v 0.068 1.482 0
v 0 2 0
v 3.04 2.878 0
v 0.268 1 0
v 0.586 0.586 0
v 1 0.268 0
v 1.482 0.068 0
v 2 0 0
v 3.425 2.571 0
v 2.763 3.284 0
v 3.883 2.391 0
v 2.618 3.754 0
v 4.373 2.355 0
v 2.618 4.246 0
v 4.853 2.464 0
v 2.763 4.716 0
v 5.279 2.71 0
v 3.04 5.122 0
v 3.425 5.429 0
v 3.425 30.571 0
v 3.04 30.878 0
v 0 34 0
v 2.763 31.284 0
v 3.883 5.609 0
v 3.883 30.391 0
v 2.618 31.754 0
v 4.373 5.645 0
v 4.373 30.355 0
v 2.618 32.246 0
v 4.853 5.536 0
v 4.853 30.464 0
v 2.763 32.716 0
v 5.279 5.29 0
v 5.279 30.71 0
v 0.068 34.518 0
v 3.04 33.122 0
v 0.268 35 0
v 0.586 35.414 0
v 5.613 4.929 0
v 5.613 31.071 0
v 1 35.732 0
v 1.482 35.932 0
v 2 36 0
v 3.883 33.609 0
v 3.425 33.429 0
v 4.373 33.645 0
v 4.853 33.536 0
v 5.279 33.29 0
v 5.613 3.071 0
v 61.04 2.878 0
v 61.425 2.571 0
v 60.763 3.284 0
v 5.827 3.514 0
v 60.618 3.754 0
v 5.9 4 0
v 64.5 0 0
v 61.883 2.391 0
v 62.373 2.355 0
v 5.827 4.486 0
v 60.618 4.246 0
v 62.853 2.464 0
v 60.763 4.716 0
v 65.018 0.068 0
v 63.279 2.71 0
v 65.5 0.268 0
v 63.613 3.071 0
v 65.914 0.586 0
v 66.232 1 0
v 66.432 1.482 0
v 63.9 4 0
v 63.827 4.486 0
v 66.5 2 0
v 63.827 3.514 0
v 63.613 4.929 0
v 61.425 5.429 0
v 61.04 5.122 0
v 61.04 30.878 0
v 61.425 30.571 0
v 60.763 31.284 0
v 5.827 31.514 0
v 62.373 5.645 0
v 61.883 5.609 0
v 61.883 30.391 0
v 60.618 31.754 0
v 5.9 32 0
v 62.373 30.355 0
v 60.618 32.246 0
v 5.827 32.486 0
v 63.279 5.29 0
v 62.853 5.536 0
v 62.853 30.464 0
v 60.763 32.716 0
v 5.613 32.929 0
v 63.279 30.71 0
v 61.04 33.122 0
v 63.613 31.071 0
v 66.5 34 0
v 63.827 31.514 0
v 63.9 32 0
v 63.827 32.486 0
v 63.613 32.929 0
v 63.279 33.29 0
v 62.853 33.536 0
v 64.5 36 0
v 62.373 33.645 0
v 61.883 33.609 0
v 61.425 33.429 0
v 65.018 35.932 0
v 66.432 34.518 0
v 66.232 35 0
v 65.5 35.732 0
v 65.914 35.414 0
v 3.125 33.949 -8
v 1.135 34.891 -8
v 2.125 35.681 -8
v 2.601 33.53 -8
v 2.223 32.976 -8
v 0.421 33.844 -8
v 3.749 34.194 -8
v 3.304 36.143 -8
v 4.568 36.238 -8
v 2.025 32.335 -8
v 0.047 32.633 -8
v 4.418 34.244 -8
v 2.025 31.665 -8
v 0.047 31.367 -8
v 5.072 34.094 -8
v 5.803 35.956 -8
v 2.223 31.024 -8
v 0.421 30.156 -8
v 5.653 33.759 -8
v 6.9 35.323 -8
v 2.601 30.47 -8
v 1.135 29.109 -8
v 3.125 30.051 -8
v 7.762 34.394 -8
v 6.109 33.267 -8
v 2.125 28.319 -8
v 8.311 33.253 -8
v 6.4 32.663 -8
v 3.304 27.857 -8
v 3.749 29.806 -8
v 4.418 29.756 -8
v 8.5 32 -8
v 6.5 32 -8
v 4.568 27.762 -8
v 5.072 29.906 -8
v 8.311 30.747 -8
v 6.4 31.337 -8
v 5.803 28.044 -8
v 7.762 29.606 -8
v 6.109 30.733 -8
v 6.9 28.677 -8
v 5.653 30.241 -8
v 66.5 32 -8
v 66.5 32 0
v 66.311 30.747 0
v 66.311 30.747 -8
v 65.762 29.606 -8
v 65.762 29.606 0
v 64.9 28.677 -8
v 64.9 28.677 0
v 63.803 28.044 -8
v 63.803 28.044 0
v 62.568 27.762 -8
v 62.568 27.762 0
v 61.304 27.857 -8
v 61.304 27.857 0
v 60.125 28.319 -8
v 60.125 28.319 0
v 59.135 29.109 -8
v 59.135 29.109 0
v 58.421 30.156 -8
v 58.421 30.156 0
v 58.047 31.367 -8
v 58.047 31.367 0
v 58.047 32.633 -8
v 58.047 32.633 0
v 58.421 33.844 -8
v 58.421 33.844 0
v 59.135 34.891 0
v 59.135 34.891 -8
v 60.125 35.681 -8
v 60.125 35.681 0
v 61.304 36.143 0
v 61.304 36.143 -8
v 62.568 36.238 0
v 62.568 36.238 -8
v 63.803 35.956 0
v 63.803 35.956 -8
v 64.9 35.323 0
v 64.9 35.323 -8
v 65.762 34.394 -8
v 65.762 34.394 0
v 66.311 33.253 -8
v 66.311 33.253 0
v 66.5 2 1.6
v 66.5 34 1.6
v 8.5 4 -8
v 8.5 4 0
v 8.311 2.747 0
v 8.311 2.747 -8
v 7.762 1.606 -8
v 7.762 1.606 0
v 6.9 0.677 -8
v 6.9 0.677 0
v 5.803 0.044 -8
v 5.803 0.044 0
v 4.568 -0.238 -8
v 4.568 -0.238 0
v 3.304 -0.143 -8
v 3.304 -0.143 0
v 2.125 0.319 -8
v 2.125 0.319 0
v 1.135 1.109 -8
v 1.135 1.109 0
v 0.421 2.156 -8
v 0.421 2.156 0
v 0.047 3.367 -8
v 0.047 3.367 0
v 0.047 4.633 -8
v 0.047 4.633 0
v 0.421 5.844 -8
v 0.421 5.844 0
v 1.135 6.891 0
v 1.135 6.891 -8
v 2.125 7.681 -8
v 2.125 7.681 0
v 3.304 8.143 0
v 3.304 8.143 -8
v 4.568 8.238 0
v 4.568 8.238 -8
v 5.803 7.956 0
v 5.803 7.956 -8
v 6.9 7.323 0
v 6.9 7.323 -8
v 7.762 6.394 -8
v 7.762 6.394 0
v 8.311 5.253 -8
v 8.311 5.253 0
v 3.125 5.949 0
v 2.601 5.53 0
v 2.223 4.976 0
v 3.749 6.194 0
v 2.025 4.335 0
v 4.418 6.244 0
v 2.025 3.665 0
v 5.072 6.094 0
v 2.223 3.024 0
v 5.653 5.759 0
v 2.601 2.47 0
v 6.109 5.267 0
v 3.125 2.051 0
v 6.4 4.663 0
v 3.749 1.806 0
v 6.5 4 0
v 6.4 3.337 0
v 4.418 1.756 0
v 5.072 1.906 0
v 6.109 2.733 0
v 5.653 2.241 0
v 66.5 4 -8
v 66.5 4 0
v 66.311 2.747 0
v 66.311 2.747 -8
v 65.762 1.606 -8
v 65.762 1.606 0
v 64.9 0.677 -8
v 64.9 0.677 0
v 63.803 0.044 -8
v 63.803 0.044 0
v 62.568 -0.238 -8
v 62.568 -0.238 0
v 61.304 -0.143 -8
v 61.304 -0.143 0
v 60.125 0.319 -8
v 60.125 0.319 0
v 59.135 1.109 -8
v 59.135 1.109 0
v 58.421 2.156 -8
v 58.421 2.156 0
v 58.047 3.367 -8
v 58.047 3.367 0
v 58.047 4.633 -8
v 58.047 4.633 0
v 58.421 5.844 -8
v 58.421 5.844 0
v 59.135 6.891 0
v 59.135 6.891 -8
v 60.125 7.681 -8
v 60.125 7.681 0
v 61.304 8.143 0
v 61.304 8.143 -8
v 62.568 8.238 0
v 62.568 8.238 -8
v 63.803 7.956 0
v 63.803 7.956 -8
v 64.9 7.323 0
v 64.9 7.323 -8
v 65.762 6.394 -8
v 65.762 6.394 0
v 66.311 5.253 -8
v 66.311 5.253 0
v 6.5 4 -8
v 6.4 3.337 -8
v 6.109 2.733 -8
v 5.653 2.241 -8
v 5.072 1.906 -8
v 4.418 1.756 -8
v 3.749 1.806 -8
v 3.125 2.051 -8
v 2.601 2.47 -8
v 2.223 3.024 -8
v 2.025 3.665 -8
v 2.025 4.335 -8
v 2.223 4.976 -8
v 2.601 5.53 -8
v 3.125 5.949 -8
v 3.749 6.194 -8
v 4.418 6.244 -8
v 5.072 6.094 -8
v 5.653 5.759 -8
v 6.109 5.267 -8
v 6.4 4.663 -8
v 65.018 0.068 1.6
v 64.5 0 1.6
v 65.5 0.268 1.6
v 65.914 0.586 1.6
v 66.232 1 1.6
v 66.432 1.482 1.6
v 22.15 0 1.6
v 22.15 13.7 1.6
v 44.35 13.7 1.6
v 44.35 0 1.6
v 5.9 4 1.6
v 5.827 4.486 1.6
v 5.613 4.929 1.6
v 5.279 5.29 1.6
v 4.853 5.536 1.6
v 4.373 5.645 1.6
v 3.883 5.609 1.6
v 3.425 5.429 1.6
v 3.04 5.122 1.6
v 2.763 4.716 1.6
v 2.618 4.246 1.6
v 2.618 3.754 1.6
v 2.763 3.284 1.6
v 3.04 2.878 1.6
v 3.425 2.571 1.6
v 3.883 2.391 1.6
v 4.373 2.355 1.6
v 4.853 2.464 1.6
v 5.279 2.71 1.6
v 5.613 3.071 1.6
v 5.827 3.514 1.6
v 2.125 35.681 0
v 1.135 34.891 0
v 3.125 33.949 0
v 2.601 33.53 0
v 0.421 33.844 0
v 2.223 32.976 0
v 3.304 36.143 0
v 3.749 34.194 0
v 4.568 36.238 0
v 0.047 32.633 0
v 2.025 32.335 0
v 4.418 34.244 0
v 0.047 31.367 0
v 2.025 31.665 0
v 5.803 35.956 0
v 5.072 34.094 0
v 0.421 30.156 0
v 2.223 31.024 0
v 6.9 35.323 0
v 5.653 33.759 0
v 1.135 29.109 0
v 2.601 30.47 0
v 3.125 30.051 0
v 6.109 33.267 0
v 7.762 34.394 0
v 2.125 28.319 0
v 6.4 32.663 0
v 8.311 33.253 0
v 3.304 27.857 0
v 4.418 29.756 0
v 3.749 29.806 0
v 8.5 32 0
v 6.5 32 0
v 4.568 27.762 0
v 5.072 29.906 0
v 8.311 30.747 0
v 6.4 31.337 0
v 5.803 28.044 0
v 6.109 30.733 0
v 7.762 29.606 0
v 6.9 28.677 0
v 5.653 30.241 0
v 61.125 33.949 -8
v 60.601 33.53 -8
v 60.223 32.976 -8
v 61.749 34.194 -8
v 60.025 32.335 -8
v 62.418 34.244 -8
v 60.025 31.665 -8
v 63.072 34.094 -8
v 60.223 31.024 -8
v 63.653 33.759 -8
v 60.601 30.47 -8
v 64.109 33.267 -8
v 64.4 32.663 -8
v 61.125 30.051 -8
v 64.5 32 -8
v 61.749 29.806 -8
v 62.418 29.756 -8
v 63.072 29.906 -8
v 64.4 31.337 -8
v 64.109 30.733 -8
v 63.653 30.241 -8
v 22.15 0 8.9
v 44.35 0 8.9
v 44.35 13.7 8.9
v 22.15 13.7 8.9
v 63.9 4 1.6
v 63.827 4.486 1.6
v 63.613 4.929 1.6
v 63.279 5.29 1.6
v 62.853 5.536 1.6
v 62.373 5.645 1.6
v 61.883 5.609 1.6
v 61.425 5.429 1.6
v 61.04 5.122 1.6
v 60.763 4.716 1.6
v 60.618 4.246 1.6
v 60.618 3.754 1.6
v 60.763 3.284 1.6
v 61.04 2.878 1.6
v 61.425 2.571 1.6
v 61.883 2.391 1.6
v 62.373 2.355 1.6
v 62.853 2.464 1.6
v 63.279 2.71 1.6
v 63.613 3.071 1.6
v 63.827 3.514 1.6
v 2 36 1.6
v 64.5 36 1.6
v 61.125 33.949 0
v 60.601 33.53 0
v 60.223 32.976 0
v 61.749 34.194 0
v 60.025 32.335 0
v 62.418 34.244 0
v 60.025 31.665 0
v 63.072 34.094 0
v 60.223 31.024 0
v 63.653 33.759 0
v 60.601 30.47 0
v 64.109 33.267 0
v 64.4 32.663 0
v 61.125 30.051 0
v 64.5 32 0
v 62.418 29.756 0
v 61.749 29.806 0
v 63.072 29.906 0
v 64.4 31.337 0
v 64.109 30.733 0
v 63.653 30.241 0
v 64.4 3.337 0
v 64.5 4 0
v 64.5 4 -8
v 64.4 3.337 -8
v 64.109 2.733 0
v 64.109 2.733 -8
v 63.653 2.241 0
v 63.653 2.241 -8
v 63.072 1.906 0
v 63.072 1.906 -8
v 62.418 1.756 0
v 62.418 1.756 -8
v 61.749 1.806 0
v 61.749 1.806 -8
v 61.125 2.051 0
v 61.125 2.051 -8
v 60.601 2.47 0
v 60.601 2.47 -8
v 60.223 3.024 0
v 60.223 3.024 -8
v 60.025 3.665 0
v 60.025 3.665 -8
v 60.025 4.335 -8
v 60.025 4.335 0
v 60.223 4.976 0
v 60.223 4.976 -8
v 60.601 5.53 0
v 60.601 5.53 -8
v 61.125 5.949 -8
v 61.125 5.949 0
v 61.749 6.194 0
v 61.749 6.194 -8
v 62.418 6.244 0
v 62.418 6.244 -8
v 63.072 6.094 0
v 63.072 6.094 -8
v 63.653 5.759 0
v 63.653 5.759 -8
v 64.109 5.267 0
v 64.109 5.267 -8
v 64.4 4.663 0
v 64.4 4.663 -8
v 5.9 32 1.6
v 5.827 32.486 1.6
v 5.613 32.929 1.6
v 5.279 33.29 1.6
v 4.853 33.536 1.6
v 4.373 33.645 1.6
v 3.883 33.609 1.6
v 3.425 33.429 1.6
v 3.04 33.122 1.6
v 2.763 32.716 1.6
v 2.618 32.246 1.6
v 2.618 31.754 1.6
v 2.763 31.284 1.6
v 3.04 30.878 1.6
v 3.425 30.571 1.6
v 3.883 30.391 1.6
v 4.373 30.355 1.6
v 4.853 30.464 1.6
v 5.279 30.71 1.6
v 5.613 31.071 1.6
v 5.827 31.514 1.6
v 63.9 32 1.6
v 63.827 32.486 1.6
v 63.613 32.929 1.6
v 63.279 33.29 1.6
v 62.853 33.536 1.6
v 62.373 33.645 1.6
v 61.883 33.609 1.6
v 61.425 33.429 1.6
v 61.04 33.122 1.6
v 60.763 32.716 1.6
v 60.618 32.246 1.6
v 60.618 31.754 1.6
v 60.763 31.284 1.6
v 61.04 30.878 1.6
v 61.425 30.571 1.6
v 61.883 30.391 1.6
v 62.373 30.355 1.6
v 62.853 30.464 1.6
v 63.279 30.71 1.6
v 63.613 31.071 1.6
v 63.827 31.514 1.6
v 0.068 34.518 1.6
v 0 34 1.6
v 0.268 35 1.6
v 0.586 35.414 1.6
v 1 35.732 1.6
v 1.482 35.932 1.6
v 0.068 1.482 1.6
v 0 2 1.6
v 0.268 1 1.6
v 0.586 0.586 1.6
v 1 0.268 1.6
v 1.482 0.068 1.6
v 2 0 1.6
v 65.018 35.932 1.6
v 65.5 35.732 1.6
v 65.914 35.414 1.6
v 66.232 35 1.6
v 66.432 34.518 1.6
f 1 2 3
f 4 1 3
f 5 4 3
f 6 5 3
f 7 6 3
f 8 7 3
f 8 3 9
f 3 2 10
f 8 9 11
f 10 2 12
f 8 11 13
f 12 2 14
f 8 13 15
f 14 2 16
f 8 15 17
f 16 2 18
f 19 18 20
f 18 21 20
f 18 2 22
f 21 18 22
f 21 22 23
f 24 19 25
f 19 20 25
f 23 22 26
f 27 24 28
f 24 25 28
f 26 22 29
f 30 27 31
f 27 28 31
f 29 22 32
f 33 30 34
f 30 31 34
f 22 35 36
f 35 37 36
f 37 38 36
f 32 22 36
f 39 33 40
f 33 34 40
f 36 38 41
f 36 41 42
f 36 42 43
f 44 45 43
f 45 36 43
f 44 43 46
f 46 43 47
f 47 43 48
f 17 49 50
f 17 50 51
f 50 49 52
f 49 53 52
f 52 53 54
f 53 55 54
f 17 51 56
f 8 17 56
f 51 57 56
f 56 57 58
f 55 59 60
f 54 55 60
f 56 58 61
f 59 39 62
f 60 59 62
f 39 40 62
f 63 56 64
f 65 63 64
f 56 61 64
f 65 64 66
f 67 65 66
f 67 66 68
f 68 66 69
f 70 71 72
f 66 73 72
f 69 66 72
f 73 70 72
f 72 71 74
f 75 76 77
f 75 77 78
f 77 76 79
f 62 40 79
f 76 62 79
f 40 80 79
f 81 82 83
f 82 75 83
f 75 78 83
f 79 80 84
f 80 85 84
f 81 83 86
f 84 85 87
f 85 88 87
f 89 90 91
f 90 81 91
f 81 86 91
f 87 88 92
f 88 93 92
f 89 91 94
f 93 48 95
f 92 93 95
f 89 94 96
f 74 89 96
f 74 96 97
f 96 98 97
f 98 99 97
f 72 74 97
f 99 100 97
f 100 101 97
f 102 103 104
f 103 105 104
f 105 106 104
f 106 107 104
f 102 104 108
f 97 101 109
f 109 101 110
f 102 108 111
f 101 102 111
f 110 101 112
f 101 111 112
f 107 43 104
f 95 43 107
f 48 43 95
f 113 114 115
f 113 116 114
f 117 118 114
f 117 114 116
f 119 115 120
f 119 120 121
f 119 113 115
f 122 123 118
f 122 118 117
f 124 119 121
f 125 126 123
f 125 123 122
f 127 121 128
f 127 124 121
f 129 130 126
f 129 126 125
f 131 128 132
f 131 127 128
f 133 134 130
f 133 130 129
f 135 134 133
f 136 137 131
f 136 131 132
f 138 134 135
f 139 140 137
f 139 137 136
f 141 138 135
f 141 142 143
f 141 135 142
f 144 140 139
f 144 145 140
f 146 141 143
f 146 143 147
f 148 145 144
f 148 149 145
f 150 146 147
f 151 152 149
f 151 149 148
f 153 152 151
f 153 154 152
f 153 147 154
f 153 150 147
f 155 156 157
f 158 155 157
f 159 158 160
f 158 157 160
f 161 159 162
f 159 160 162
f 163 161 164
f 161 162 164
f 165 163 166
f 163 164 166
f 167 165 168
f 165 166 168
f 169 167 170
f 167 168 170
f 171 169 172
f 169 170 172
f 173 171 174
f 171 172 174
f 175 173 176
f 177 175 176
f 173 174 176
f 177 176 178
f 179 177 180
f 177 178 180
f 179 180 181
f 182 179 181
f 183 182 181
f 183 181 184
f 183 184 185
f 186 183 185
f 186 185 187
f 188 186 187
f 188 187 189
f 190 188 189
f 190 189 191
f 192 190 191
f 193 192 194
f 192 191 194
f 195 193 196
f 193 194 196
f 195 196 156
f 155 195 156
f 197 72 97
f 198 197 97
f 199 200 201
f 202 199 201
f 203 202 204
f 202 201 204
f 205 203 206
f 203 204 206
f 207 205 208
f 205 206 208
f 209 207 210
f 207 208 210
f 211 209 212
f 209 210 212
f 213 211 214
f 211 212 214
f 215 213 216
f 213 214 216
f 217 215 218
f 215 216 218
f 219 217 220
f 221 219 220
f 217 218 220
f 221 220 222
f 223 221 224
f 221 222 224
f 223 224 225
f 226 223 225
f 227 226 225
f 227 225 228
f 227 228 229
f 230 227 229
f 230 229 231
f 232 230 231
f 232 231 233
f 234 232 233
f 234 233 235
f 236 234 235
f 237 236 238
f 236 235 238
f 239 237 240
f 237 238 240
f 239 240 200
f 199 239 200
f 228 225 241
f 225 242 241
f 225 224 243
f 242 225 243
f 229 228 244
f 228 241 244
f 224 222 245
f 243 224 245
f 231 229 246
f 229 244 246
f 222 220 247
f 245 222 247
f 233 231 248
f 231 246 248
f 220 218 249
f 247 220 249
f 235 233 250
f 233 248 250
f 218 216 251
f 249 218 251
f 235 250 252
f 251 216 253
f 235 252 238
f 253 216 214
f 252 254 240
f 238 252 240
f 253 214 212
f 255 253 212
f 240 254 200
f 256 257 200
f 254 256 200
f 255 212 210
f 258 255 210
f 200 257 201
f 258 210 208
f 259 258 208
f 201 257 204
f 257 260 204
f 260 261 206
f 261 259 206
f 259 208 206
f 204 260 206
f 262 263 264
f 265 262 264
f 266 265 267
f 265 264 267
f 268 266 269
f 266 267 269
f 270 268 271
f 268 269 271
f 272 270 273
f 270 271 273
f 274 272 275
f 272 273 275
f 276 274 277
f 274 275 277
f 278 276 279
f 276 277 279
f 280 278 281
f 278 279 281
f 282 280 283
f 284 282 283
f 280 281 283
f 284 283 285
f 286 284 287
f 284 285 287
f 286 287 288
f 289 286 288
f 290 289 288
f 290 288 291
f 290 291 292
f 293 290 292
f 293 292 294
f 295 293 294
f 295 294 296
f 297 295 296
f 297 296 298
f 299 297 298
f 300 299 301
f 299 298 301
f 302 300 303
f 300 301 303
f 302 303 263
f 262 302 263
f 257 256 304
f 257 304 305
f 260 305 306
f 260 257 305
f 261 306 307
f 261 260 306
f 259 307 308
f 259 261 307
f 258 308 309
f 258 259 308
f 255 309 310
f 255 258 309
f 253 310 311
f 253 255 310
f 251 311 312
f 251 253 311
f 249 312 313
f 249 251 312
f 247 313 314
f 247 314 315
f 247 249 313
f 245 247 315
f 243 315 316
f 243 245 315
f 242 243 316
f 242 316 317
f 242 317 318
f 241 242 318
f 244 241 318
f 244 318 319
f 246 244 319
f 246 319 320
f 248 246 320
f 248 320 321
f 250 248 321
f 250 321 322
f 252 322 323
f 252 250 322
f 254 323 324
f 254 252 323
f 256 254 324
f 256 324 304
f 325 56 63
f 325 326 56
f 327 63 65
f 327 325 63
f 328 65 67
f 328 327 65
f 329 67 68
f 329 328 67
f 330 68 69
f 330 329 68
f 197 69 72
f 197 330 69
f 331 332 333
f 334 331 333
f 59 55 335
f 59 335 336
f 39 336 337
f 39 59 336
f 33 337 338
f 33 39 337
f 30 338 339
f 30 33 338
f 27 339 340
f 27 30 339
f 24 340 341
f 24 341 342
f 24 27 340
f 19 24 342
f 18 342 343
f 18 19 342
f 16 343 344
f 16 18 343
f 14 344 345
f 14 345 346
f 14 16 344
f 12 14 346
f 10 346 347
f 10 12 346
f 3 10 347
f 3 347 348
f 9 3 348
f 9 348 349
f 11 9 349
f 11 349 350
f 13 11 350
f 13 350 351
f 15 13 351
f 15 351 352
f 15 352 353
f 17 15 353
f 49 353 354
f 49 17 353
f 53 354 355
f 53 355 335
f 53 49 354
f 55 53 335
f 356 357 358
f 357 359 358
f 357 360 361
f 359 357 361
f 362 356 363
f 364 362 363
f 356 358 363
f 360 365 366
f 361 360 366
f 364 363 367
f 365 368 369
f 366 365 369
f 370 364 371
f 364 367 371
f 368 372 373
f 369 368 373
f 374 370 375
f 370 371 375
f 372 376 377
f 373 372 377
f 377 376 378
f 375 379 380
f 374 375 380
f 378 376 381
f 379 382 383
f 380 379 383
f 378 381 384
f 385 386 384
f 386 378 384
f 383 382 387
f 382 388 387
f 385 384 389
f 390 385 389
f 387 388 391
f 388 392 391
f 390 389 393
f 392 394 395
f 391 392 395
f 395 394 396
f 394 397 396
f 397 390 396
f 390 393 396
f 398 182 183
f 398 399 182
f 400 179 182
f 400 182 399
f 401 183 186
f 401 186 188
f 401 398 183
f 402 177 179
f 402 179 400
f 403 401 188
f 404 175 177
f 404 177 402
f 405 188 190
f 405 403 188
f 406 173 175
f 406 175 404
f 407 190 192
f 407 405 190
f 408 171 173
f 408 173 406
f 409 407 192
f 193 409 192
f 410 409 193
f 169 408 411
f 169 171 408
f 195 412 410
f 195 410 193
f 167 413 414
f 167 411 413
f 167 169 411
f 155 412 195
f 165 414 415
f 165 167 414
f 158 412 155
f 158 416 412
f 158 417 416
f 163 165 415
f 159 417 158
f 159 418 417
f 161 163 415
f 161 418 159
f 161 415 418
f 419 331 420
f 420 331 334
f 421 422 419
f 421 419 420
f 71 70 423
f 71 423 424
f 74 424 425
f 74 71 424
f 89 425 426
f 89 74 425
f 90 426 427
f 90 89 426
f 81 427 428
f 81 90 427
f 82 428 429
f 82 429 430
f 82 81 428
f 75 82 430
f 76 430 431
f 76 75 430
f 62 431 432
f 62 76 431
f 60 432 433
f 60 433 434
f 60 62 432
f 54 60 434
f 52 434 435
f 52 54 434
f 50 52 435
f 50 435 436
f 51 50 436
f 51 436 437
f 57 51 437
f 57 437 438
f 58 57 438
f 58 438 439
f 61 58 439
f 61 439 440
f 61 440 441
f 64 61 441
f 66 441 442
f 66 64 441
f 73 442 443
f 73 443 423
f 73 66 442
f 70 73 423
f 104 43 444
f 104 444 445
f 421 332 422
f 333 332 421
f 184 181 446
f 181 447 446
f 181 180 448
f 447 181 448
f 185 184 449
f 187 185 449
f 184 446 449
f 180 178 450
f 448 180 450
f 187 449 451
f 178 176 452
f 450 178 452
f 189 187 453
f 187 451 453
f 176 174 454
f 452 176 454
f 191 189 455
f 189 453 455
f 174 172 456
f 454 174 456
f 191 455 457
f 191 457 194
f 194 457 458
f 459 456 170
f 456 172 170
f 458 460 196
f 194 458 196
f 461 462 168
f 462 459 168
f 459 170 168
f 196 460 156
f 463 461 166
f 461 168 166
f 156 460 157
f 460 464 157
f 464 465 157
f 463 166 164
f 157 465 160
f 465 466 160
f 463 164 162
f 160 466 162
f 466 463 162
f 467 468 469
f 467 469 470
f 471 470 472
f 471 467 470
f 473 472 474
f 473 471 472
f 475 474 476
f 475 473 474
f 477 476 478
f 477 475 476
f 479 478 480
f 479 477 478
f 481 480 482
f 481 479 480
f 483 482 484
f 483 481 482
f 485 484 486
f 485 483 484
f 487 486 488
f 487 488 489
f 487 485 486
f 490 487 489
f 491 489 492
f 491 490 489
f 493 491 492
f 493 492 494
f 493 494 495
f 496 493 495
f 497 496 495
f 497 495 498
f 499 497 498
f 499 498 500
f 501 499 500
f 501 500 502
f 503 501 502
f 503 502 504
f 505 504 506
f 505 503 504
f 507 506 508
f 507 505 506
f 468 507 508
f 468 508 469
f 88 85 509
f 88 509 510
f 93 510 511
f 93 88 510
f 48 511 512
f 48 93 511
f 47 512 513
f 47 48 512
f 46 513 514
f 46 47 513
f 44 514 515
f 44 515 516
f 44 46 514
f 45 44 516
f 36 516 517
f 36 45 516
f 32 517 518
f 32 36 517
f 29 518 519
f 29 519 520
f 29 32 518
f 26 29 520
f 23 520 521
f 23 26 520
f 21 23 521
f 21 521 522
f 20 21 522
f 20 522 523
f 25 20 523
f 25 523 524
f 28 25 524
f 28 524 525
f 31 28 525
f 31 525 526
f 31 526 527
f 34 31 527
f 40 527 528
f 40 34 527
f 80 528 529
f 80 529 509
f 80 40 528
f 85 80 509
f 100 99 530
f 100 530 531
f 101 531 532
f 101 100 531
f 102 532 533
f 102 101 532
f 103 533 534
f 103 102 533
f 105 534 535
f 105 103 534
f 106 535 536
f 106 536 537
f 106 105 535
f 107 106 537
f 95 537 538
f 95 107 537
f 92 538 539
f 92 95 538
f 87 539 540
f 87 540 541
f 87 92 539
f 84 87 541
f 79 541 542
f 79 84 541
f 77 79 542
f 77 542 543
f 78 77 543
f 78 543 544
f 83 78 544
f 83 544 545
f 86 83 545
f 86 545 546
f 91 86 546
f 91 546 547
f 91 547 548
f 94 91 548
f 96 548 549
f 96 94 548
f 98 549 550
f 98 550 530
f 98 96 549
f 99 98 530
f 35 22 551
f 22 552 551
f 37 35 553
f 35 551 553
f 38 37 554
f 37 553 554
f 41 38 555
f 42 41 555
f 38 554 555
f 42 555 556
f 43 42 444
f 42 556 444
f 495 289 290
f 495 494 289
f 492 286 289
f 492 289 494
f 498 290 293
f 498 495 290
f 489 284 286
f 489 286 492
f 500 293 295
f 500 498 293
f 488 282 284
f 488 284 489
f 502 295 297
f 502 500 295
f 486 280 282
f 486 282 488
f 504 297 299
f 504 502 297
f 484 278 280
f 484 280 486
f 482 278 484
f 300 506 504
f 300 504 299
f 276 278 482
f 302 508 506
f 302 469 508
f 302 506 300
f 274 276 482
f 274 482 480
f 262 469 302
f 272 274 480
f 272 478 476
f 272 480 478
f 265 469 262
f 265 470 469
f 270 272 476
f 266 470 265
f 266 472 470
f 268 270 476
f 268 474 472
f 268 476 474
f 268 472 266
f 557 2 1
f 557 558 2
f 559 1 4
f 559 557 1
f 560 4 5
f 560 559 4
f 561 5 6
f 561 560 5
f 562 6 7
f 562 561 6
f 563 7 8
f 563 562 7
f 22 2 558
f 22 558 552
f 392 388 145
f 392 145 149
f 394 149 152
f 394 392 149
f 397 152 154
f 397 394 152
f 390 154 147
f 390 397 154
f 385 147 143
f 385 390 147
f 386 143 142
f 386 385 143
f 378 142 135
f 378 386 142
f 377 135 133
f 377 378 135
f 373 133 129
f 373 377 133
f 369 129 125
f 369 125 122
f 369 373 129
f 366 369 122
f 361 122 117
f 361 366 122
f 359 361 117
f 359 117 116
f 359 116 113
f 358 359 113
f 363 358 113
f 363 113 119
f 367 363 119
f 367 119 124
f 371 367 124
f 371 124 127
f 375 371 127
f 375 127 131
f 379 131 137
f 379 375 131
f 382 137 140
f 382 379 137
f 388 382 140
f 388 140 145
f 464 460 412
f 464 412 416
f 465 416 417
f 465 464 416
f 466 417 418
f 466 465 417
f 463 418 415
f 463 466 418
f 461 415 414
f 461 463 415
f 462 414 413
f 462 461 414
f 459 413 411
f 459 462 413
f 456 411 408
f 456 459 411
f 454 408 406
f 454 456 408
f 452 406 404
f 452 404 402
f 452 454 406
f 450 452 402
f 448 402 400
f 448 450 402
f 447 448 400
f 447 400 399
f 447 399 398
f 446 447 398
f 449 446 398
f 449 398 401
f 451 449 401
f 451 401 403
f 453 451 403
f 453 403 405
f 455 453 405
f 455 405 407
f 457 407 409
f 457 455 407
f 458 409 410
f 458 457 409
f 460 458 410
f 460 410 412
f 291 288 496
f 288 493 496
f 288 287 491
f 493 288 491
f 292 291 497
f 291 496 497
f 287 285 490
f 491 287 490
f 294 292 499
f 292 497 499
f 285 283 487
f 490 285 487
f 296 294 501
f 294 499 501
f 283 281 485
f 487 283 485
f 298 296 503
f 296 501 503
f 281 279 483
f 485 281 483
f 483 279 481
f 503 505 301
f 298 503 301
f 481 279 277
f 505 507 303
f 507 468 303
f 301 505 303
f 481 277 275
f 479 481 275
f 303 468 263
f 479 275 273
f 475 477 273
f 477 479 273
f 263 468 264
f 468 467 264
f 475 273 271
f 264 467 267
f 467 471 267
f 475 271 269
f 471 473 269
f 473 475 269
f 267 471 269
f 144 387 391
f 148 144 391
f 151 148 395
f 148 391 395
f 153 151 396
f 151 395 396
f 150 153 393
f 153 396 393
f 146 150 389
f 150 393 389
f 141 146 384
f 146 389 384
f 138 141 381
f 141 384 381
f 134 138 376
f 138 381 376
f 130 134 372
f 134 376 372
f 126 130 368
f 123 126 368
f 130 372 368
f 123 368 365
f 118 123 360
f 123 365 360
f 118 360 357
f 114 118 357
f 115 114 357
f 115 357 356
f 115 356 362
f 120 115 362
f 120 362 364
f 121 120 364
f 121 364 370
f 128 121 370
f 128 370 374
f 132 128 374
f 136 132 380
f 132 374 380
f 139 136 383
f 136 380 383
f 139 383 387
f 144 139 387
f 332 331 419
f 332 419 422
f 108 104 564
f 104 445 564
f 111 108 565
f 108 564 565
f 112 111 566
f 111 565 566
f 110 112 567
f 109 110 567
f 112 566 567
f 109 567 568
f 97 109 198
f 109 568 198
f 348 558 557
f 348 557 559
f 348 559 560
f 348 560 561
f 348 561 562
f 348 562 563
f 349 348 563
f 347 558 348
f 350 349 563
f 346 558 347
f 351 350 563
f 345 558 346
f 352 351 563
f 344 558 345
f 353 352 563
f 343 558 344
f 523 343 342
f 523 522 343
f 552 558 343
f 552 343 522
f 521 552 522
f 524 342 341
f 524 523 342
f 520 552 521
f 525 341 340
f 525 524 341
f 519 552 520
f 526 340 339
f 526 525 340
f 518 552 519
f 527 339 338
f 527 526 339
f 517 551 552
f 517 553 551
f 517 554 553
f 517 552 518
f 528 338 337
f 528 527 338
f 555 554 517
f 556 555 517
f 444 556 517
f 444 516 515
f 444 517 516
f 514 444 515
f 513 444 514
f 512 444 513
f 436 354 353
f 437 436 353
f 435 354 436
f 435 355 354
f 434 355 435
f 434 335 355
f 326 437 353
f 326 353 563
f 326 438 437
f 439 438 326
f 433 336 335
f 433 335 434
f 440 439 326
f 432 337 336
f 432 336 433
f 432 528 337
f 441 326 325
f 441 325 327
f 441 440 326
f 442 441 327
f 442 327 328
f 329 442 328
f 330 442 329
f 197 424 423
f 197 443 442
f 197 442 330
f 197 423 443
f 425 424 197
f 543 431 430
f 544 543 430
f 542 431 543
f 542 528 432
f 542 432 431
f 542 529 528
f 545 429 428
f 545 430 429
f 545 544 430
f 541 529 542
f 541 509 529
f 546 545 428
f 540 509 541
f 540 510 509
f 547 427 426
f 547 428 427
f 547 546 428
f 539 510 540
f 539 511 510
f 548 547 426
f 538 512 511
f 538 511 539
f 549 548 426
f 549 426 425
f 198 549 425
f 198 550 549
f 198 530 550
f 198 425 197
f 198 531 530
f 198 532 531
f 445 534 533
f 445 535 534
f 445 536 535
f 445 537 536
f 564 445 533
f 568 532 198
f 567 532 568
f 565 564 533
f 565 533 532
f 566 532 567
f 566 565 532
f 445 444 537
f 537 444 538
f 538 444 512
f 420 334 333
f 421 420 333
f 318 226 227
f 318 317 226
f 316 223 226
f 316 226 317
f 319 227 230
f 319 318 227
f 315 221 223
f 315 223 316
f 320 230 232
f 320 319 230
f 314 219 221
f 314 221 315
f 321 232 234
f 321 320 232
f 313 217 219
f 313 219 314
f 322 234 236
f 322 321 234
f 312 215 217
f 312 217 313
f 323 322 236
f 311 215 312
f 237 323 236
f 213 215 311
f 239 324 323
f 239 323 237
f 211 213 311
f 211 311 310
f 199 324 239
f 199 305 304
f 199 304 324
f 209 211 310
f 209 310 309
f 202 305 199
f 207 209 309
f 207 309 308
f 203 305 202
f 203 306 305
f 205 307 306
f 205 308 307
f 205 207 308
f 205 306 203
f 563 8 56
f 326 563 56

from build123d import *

# Parameters (mm, degrees)
F0_W     = 66.5
F0_H     = 36
F0_R     = 1.65
F1_DEPTH = 1.6
F2_R     = 2
F3_W     = 22.2
F3_H     = 13.7
F4_DEPTH = 7.3
F5_R     = 4.25
F5_R_2   = 2.25
F6_DEPTH = 8


with BuildPart() as f1:
    # F0 (on Top) → F1 (new body)
    with BuildSketch(Plane.XY):
        with Locations((33.25, 18)):
            Rectangle(F0_W, F0_H)
        with Locations((4.25, 4)):
            Circle(F0_R, mode=Mode.SUBTRACT)
        with Locations((62.25, 4)):
            Circle(F0_R, mode=Mode.SUBTRACT)
        with Locations((4.25, 32)):
            Circle(F0_R, mode=Mode.SUBTRACT)
        with Locations((62.25, 32)):
            Circle(F0_R, mode=Mode.SUBTRACT)
    extrude(amount=F1_DEPTH)

    # F2
    f2_edges = [f1.edges().sort_by_distance(p)[0] for p in [
        (66.5, 0, 0.8),
        (0, 0, 0.8),
        (0, 36, 0.8),
        (66.5, 36, 0.8),
    ]]
    fillet(f2_edges, radius=F2_R)


with BuildPart() as f4:
    # F3 (on face) → F4 (new body)
    with BuildSketch(Plane.XY.offset(1.6)):
        with Locations((33.25, 6.85)):
            Rectangle(F3_W, F3_H)
    extrude(amount=F4_DEPTH)


with BuildPart() as f6:
    # F5 (on face) → F6 (new body)
    with BuildSketch(Plane(origin=(0, 0, 0), x_dir=(1, 0, 0), z_dir=(0, 0, -1))):
        with Locations((4.25, -4)):
            Circle(F5_R)
        with Locations((4.25, -4)):
            Circle(F5_R_2, mode=Mode.SUBTRACT)
        with Locations((62.25, -4)):
            Circle(F5_R)
        with Locations((62.25, -4)):
            Circle(F5_R_2, mode=Mode.SUBTRACT)
        with Locations((4.25, -32)):
            Circle(F5_R)
        with Locations((4.25, -32)):
            Circle(F5_R_2, mode=Mode.SUBTRACT)
        with Locations((62.25, -32)):
            Circle(F5_R)
        with Locations((62.25, -32)):
            Circle(F5_R_2, mode=Mode.SUBTRACT)
    extrude(amount=F6_DEPTH)


solid = Compound([f1.part, f4.part, f6.part])
